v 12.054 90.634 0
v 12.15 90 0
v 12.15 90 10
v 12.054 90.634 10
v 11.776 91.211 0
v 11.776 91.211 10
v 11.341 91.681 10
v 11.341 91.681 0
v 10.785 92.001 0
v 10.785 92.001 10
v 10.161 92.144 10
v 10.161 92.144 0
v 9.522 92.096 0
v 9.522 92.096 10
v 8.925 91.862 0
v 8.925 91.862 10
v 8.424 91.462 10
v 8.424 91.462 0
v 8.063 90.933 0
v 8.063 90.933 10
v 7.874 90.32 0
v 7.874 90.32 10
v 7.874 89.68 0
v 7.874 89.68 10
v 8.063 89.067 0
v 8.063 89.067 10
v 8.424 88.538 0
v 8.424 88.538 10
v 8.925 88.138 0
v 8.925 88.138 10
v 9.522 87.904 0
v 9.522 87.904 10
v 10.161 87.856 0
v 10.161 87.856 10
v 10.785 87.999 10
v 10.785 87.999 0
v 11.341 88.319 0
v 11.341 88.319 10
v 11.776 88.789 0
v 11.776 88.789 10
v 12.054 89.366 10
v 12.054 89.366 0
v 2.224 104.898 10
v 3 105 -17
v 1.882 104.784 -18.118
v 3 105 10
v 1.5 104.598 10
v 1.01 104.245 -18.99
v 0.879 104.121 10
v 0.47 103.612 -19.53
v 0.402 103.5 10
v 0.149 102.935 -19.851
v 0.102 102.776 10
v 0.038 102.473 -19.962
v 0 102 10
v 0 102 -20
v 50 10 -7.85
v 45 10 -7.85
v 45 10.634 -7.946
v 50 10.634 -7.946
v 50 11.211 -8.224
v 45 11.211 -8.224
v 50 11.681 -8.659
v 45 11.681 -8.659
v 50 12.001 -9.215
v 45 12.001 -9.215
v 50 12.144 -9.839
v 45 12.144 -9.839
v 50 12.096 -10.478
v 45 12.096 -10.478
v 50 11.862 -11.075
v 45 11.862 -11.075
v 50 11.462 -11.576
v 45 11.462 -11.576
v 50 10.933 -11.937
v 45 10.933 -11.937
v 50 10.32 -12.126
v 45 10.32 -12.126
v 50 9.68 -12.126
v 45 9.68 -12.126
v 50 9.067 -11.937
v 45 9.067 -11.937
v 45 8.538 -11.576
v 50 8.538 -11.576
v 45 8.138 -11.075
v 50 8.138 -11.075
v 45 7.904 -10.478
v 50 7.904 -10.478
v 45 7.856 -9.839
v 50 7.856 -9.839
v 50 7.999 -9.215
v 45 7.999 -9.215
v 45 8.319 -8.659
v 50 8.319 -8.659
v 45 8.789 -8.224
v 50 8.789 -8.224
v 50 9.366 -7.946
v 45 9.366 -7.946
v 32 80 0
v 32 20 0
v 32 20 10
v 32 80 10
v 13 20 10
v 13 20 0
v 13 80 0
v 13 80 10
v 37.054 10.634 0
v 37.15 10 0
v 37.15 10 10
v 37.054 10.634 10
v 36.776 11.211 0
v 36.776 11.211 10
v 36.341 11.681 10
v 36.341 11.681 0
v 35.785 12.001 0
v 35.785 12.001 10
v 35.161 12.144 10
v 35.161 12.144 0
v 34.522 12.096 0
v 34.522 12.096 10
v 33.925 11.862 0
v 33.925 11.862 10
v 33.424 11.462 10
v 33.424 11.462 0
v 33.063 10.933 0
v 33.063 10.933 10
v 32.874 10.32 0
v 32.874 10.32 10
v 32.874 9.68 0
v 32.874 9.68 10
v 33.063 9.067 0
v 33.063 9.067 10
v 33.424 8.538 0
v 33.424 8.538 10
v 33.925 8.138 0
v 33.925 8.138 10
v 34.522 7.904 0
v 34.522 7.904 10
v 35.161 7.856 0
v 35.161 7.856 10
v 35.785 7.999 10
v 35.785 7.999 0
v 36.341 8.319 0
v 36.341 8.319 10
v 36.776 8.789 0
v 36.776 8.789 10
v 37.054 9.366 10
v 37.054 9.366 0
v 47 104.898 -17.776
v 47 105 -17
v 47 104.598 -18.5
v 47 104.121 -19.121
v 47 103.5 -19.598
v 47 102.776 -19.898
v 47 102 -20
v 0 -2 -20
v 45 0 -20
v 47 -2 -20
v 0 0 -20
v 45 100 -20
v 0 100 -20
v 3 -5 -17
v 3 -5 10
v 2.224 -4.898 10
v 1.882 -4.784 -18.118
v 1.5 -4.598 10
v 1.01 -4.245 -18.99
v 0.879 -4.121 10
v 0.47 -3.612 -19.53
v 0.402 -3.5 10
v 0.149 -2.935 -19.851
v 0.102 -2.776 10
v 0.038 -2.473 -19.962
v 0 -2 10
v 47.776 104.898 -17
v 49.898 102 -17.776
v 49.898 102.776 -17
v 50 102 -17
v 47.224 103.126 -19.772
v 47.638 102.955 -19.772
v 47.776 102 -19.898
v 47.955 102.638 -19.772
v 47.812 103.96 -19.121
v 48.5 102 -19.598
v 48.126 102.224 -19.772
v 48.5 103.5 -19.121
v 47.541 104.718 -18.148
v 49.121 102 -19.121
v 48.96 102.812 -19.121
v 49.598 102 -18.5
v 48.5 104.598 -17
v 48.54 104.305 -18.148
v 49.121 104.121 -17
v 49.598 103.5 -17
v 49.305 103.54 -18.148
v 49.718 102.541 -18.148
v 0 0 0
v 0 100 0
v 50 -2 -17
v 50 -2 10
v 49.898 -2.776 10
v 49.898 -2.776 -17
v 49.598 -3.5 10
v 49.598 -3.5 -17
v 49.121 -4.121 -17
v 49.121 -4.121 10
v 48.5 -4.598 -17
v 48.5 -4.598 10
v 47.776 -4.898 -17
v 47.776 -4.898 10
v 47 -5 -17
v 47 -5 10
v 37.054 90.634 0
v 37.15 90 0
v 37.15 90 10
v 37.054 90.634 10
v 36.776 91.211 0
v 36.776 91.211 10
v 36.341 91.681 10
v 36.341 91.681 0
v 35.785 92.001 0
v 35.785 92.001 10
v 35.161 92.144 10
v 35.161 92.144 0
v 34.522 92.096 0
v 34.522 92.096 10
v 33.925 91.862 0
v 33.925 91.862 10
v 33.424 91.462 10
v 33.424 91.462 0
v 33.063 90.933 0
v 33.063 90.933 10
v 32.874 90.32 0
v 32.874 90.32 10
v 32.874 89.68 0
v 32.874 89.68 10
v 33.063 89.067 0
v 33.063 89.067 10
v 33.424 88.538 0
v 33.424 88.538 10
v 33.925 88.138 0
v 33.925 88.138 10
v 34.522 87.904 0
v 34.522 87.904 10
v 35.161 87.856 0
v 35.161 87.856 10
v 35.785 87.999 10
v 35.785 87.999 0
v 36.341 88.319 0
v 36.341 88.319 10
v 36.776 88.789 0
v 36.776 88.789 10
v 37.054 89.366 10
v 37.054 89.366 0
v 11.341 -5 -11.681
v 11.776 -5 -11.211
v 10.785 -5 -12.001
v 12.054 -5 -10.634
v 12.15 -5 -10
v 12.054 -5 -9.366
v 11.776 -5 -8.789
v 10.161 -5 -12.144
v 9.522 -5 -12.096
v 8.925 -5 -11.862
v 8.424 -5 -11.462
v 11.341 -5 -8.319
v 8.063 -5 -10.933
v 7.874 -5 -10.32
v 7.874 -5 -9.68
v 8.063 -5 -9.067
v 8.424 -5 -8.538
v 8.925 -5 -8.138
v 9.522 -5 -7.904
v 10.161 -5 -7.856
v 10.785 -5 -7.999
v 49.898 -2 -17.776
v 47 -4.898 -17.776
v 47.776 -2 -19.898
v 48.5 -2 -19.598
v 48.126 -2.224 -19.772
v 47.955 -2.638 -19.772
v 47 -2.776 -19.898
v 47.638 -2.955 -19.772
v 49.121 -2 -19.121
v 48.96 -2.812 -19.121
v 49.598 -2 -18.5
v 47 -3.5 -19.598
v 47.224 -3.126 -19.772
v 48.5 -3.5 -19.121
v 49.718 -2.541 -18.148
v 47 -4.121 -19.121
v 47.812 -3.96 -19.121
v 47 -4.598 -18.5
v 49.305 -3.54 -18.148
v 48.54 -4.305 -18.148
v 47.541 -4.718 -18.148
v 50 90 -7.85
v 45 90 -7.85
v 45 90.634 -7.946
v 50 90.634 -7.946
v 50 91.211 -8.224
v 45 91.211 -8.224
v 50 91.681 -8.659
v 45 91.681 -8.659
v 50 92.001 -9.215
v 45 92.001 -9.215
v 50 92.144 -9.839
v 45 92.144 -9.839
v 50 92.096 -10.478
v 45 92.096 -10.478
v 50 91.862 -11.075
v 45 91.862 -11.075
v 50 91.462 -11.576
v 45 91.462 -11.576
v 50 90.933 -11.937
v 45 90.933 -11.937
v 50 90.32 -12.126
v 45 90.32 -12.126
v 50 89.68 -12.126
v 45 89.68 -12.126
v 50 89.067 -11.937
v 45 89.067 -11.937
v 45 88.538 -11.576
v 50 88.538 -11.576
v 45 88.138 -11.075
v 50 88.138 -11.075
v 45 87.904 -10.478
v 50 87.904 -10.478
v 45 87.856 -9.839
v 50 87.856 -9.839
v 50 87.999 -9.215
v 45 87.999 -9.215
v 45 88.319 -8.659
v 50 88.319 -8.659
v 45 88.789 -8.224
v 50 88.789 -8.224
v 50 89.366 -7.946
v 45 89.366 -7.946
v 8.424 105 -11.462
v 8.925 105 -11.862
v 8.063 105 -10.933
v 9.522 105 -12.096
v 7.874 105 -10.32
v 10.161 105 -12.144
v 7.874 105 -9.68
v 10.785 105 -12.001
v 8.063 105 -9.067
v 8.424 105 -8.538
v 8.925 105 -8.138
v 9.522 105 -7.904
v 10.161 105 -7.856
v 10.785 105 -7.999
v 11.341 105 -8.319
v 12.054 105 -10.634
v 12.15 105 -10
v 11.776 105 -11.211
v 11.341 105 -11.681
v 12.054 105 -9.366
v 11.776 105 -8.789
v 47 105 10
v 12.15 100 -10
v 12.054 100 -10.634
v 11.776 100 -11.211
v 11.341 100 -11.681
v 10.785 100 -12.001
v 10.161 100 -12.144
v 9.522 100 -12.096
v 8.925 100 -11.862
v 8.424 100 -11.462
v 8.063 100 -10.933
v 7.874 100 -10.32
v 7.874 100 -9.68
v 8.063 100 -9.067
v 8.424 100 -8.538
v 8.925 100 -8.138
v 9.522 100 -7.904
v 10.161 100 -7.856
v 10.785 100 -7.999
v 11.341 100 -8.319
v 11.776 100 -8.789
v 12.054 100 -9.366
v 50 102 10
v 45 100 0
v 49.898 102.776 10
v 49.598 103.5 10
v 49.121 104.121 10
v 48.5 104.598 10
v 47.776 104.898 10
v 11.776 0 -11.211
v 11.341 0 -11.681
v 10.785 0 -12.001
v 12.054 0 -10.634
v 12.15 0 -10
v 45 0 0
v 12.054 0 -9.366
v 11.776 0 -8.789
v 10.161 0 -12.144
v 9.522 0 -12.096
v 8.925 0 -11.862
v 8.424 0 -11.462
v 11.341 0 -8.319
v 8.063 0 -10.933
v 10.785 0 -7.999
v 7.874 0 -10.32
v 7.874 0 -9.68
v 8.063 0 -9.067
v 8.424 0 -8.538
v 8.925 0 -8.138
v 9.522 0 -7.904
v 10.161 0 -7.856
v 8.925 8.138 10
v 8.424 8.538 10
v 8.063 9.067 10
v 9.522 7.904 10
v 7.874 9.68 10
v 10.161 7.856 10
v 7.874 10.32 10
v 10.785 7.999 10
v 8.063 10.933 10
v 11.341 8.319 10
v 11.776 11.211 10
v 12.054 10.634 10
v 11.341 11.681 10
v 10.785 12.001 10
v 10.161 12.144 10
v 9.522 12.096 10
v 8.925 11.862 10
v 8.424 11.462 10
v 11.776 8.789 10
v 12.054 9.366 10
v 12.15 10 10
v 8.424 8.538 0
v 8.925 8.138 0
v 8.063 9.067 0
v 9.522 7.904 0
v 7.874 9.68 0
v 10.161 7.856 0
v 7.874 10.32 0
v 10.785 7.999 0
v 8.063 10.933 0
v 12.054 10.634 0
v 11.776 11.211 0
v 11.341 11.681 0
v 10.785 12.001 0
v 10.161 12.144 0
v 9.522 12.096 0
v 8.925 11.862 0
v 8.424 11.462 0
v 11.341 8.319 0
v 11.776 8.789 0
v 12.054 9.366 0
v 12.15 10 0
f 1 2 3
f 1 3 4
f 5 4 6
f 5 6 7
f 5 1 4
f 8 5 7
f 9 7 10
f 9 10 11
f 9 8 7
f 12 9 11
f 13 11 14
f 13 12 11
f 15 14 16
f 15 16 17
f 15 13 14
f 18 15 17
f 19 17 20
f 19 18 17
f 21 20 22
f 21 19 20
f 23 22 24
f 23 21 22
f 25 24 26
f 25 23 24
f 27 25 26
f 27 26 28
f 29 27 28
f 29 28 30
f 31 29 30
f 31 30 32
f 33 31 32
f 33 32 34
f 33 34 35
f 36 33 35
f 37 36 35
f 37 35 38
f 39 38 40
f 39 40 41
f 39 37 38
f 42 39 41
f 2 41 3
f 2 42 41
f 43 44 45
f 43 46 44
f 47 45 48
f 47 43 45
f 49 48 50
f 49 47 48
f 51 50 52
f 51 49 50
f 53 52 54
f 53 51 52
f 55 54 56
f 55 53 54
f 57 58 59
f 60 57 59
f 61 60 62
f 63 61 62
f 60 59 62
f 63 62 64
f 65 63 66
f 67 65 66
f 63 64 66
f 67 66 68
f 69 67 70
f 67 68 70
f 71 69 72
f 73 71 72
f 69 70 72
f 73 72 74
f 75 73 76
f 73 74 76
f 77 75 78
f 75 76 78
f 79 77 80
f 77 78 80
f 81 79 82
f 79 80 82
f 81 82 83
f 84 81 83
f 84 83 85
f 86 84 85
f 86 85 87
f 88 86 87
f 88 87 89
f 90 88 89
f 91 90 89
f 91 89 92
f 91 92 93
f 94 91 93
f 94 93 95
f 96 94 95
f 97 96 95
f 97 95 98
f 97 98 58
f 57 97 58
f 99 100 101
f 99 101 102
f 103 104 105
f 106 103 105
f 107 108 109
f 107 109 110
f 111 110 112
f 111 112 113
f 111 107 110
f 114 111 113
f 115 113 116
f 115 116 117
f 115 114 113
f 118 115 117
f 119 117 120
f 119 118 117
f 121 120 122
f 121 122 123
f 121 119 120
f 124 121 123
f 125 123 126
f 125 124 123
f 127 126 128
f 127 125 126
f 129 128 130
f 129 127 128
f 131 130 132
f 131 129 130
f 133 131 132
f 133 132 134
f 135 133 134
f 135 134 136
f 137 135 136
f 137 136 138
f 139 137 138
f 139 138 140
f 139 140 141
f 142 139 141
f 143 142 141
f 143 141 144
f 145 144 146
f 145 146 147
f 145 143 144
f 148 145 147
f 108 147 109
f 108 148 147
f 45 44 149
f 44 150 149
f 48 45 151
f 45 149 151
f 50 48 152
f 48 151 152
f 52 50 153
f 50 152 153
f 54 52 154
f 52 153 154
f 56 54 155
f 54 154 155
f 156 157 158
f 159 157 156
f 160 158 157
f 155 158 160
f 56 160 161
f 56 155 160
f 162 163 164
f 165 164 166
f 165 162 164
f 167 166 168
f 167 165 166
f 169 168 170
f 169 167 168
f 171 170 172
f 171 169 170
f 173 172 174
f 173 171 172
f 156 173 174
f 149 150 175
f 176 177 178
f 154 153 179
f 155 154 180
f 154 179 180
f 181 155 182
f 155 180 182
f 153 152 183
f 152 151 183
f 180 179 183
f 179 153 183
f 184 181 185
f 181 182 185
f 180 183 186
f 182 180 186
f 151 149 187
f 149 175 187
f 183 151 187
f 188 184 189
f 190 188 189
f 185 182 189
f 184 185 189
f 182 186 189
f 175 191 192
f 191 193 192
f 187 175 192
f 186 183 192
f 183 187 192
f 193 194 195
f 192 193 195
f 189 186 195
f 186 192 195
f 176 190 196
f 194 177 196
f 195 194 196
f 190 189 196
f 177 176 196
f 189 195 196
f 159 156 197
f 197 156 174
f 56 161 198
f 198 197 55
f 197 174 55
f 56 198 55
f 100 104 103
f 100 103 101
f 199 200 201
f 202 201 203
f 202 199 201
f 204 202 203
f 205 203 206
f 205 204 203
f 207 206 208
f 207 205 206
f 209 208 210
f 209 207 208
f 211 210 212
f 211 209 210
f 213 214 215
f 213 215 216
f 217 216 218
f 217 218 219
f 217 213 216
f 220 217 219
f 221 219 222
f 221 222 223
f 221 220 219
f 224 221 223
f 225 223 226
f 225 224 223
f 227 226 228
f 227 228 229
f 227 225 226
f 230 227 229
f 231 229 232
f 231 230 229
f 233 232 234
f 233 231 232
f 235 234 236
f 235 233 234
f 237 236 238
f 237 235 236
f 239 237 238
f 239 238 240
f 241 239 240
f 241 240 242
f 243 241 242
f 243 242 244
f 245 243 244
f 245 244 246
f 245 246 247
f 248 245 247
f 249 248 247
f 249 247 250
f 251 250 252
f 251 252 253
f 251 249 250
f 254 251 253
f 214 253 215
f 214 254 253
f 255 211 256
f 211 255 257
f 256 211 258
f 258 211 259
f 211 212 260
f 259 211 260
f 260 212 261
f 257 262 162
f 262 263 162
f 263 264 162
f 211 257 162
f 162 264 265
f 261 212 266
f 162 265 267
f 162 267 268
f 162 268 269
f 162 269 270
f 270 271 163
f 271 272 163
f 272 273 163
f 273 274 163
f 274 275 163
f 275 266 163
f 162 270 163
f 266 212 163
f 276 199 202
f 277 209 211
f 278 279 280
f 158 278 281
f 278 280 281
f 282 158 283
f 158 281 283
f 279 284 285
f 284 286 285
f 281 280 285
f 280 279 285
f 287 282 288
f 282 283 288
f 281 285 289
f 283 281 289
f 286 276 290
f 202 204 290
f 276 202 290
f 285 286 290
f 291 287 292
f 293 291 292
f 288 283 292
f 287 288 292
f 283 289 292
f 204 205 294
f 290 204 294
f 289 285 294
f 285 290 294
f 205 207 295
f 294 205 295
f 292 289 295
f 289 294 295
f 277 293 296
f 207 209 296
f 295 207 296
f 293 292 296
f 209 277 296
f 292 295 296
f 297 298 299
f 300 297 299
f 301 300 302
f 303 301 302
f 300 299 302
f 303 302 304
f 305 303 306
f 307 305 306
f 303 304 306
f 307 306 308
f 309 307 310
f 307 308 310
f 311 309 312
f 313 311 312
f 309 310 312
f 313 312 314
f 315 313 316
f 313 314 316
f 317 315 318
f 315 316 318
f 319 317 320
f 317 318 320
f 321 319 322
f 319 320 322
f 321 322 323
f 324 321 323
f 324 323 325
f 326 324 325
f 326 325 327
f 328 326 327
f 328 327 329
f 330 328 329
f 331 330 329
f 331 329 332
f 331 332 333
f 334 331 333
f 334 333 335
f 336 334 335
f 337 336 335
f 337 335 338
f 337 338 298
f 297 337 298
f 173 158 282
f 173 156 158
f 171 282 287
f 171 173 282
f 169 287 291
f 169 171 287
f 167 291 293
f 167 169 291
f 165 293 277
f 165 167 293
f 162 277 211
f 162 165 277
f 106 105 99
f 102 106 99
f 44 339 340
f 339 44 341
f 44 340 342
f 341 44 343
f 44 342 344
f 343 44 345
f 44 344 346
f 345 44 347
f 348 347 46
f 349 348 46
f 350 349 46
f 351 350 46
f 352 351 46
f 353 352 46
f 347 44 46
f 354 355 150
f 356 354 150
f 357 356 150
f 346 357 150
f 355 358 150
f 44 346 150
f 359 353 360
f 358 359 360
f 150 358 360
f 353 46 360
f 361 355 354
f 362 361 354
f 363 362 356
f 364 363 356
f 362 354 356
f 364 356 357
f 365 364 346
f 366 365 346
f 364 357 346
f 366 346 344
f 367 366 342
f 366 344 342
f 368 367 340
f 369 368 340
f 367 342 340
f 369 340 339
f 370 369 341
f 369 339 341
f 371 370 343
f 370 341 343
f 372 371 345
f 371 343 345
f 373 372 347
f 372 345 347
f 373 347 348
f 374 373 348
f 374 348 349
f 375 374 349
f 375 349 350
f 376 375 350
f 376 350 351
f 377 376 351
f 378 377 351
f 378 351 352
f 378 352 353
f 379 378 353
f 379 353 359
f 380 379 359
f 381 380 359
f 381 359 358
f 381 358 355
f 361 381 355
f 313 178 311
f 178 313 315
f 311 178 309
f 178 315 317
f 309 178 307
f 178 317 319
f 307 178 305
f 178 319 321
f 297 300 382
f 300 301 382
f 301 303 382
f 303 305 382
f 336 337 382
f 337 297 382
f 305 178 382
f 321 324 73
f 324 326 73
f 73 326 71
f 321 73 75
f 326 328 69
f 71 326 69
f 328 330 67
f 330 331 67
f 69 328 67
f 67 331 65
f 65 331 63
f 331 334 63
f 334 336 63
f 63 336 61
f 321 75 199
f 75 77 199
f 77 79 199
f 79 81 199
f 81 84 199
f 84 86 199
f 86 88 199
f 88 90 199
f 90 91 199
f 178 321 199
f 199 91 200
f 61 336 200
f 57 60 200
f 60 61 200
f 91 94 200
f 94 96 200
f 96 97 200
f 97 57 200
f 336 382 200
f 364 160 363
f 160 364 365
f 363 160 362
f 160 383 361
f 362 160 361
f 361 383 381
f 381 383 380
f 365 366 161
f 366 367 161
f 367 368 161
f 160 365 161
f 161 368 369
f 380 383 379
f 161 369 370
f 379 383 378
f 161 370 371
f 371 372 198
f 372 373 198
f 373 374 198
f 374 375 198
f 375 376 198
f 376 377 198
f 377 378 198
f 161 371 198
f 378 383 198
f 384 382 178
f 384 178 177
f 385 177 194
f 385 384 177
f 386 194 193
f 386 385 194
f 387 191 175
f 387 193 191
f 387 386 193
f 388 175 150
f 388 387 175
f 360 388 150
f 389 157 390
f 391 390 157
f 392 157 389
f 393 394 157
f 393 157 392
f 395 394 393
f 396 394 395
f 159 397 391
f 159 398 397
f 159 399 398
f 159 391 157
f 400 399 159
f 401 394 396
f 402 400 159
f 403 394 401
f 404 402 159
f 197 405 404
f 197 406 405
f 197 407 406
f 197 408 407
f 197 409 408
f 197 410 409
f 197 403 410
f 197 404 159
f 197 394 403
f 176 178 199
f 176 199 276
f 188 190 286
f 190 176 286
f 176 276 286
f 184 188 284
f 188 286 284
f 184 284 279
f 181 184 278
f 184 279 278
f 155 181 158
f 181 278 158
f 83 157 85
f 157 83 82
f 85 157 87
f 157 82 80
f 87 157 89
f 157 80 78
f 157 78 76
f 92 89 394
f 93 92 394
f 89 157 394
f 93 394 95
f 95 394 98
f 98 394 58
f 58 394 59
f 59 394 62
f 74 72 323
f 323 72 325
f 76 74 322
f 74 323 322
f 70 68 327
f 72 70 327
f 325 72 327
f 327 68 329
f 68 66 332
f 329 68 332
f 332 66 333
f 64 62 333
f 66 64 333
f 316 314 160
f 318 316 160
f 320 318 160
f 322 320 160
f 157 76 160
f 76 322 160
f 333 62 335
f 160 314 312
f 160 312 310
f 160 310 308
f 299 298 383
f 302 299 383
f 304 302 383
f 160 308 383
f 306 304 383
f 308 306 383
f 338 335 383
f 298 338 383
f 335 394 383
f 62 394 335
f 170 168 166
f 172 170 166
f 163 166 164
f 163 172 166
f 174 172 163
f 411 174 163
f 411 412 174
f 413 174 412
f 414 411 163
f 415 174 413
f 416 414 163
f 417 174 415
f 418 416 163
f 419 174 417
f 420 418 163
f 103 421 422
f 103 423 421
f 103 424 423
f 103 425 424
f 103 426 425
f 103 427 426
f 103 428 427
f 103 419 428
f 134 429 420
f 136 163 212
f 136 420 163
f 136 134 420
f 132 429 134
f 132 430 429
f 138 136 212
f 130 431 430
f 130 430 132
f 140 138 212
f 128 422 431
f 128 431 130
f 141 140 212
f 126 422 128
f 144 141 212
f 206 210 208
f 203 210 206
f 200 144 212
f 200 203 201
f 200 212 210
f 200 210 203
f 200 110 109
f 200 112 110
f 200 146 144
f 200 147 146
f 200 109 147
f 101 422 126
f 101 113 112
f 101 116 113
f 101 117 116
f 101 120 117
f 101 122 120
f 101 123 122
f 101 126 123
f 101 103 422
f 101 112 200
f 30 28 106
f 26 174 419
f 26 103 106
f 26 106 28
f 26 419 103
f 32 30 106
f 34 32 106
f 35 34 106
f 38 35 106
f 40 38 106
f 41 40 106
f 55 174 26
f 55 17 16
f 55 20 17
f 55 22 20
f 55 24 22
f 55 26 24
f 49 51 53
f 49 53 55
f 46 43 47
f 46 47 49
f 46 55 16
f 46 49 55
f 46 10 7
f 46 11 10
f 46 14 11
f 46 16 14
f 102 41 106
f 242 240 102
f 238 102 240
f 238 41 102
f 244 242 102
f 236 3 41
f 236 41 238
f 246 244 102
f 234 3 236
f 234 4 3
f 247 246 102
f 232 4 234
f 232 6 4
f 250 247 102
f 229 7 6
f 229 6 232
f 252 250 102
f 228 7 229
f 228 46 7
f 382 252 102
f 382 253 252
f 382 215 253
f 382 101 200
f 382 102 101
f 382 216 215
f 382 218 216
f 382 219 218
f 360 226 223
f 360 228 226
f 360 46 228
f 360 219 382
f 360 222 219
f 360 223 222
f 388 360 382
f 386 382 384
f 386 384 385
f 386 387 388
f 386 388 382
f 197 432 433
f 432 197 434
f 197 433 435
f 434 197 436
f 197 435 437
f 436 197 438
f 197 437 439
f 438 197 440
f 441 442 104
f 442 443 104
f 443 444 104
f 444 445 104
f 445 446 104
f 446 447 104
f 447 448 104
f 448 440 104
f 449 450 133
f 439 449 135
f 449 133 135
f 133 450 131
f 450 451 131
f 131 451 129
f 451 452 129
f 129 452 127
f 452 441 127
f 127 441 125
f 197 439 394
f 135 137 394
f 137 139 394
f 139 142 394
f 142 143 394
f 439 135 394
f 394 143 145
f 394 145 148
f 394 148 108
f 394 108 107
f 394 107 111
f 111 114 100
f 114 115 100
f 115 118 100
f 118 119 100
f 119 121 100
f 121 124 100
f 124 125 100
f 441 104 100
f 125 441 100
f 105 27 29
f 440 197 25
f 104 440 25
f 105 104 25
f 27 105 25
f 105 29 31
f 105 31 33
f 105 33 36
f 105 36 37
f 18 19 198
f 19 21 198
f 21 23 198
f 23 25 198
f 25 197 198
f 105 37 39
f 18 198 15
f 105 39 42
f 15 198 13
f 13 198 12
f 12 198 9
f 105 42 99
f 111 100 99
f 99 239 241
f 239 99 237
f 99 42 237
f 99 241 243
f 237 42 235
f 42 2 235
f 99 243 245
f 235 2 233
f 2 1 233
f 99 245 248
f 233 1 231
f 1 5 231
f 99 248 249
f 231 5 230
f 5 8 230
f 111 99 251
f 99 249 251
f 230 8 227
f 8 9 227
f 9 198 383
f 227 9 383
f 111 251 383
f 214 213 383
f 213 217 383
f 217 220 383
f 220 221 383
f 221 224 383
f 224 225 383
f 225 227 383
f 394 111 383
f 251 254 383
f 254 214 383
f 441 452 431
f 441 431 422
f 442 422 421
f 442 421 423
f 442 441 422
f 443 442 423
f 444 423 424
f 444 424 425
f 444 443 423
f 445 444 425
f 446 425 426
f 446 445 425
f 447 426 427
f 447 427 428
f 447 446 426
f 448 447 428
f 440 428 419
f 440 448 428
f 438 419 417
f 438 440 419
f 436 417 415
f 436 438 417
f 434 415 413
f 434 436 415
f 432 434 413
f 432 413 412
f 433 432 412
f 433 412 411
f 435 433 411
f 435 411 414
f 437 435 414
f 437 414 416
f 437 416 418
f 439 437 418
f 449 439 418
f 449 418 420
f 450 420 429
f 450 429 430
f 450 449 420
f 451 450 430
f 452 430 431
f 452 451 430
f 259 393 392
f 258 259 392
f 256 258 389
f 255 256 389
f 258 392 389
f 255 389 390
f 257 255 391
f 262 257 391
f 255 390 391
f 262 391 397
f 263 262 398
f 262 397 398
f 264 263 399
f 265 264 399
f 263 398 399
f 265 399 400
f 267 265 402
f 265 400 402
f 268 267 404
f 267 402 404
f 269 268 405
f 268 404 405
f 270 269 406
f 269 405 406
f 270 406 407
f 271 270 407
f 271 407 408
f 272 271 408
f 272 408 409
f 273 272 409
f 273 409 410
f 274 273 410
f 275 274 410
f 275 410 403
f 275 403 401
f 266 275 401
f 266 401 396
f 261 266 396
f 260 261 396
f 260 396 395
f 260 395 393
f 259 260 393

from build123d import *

# Parameters (mm, degrees)
SKIZZE1_W                       = 19
SKIZZE1_H                       = 60
SKIZZE1_R                       = 2.15
AUFSATZ_LINEAR_AUSTRAGEN2_DEPTH = 10
SKIZZE3_W                       = 45
SKIZZE3_H                       = 5
AUFSATZ_LINEAR_AUSTRAGEN3_DEPTH = 20
SKIZZE4_R                       = 2.15
SCHNITT_LINEAR_AUSTRAGEN1_DEPTH = 20
SKIZZE5_R                       = 2.15
SCHNITT_LINEAR_AUSTRAGEN2_DEPTH = 120
VERRUNDUNG1_R                   = 3


with BuildPart() as part:
    # Skizze1 → Aufsatz-Linear austragen2 (new body)
    with BuildSketch(Plane.XY):
        Polygon((0, -5), (50, -5), (50, 105), (0, 105), (0, 90), (0, 10), align=None)
        with Locations((22.5, 50)):
            Rectangle(SKIZZE1_W, SKIZZE1_H, mode=Mode.SUBTRACT)
        with Locations((35, 10)):
            Circle(SKIZZE1_R, mode=Mode.SUBTRACT)
        with Locations((10, 10)):
            Circle(SKIZZE1_R, mode=Mode.SUBTRACT)
        with Locations((35, 90)):
            Circle(SKIZZE1_R, mode=Mode.SUBTRACT)
        with Locations((10, 90)):
            Circle(SKIZZE1_R, mode=Mode.SUBTRACT)
    extrude(amount=AUFSATZ_LINEAR_AUSTRAGEN2_DEPTH)

    # Skizze3 → Aufsatz-Linear austragen3 (add)
    with BuildSketch(Plane(origin=(0, 0, 0), x_dir=(-1, 0, 0), z_dir=(0, 0, -1))):
        Polygon((-45, 105), (-50, 105), (-50, -5), (-45, -5), (-45, 0), (-45, 100), align=None)
        with Locations((-22.5, 102.5)):
            Rectangle(SKIZZE3_W, SKIZZE3_H)
        with Locations((-22.5, -2.5)):
            Rectangle(SKIZZE3_W, SKIZZE3_H)
    extrude(amount=AUFSATZ_LINEAR_AUSTRAGEN3_DEPTH)

    # Skizze4 → Schnitt-Linear austragen1 (cut)
    with BuildSketch(Plane.ZY.offset(-45)):
        with Locations((-10, 90)):
            Circle(SKIZZE4_R)
        with Locations((-10, 10)):
            Circle(SKIZZE4_R)
    extrude(amount=-SCHNITT_LINEAR_AUSTRAGEN1_DEPTH, mode=Mode.SUBTRACT)

    # Skizze5 → Schnitt-Linear austragen2 (cut)
    with BuildSketch(Plane(origin=(0, 105, 0), x_dir=(1, 0, 0), z_dir=(0, 1, 0))):
        with Locations((10, 10)):
            Circle(SKIZZE5_R)
    extrude(amount=-SCHNITT_LINEAR_AUSTRAGEN2_DEPTH, mode=Mode.SUBTRACT)

    # Verrundung1
    verrundung1_edges = [part.edges().sort_by_distance(p)[0] for p in [
        (50, 105, -5),
        (50, -5, -5),
        (0, -5, -5),
        (0, 105, -5),
        (25, 105, -20),
        (50, 50, -20),
        (25, -5, -20),
    ]]
    fillet(verrundung1_edges, radius=VERRUNDUNG1_R)


solid = part.part
